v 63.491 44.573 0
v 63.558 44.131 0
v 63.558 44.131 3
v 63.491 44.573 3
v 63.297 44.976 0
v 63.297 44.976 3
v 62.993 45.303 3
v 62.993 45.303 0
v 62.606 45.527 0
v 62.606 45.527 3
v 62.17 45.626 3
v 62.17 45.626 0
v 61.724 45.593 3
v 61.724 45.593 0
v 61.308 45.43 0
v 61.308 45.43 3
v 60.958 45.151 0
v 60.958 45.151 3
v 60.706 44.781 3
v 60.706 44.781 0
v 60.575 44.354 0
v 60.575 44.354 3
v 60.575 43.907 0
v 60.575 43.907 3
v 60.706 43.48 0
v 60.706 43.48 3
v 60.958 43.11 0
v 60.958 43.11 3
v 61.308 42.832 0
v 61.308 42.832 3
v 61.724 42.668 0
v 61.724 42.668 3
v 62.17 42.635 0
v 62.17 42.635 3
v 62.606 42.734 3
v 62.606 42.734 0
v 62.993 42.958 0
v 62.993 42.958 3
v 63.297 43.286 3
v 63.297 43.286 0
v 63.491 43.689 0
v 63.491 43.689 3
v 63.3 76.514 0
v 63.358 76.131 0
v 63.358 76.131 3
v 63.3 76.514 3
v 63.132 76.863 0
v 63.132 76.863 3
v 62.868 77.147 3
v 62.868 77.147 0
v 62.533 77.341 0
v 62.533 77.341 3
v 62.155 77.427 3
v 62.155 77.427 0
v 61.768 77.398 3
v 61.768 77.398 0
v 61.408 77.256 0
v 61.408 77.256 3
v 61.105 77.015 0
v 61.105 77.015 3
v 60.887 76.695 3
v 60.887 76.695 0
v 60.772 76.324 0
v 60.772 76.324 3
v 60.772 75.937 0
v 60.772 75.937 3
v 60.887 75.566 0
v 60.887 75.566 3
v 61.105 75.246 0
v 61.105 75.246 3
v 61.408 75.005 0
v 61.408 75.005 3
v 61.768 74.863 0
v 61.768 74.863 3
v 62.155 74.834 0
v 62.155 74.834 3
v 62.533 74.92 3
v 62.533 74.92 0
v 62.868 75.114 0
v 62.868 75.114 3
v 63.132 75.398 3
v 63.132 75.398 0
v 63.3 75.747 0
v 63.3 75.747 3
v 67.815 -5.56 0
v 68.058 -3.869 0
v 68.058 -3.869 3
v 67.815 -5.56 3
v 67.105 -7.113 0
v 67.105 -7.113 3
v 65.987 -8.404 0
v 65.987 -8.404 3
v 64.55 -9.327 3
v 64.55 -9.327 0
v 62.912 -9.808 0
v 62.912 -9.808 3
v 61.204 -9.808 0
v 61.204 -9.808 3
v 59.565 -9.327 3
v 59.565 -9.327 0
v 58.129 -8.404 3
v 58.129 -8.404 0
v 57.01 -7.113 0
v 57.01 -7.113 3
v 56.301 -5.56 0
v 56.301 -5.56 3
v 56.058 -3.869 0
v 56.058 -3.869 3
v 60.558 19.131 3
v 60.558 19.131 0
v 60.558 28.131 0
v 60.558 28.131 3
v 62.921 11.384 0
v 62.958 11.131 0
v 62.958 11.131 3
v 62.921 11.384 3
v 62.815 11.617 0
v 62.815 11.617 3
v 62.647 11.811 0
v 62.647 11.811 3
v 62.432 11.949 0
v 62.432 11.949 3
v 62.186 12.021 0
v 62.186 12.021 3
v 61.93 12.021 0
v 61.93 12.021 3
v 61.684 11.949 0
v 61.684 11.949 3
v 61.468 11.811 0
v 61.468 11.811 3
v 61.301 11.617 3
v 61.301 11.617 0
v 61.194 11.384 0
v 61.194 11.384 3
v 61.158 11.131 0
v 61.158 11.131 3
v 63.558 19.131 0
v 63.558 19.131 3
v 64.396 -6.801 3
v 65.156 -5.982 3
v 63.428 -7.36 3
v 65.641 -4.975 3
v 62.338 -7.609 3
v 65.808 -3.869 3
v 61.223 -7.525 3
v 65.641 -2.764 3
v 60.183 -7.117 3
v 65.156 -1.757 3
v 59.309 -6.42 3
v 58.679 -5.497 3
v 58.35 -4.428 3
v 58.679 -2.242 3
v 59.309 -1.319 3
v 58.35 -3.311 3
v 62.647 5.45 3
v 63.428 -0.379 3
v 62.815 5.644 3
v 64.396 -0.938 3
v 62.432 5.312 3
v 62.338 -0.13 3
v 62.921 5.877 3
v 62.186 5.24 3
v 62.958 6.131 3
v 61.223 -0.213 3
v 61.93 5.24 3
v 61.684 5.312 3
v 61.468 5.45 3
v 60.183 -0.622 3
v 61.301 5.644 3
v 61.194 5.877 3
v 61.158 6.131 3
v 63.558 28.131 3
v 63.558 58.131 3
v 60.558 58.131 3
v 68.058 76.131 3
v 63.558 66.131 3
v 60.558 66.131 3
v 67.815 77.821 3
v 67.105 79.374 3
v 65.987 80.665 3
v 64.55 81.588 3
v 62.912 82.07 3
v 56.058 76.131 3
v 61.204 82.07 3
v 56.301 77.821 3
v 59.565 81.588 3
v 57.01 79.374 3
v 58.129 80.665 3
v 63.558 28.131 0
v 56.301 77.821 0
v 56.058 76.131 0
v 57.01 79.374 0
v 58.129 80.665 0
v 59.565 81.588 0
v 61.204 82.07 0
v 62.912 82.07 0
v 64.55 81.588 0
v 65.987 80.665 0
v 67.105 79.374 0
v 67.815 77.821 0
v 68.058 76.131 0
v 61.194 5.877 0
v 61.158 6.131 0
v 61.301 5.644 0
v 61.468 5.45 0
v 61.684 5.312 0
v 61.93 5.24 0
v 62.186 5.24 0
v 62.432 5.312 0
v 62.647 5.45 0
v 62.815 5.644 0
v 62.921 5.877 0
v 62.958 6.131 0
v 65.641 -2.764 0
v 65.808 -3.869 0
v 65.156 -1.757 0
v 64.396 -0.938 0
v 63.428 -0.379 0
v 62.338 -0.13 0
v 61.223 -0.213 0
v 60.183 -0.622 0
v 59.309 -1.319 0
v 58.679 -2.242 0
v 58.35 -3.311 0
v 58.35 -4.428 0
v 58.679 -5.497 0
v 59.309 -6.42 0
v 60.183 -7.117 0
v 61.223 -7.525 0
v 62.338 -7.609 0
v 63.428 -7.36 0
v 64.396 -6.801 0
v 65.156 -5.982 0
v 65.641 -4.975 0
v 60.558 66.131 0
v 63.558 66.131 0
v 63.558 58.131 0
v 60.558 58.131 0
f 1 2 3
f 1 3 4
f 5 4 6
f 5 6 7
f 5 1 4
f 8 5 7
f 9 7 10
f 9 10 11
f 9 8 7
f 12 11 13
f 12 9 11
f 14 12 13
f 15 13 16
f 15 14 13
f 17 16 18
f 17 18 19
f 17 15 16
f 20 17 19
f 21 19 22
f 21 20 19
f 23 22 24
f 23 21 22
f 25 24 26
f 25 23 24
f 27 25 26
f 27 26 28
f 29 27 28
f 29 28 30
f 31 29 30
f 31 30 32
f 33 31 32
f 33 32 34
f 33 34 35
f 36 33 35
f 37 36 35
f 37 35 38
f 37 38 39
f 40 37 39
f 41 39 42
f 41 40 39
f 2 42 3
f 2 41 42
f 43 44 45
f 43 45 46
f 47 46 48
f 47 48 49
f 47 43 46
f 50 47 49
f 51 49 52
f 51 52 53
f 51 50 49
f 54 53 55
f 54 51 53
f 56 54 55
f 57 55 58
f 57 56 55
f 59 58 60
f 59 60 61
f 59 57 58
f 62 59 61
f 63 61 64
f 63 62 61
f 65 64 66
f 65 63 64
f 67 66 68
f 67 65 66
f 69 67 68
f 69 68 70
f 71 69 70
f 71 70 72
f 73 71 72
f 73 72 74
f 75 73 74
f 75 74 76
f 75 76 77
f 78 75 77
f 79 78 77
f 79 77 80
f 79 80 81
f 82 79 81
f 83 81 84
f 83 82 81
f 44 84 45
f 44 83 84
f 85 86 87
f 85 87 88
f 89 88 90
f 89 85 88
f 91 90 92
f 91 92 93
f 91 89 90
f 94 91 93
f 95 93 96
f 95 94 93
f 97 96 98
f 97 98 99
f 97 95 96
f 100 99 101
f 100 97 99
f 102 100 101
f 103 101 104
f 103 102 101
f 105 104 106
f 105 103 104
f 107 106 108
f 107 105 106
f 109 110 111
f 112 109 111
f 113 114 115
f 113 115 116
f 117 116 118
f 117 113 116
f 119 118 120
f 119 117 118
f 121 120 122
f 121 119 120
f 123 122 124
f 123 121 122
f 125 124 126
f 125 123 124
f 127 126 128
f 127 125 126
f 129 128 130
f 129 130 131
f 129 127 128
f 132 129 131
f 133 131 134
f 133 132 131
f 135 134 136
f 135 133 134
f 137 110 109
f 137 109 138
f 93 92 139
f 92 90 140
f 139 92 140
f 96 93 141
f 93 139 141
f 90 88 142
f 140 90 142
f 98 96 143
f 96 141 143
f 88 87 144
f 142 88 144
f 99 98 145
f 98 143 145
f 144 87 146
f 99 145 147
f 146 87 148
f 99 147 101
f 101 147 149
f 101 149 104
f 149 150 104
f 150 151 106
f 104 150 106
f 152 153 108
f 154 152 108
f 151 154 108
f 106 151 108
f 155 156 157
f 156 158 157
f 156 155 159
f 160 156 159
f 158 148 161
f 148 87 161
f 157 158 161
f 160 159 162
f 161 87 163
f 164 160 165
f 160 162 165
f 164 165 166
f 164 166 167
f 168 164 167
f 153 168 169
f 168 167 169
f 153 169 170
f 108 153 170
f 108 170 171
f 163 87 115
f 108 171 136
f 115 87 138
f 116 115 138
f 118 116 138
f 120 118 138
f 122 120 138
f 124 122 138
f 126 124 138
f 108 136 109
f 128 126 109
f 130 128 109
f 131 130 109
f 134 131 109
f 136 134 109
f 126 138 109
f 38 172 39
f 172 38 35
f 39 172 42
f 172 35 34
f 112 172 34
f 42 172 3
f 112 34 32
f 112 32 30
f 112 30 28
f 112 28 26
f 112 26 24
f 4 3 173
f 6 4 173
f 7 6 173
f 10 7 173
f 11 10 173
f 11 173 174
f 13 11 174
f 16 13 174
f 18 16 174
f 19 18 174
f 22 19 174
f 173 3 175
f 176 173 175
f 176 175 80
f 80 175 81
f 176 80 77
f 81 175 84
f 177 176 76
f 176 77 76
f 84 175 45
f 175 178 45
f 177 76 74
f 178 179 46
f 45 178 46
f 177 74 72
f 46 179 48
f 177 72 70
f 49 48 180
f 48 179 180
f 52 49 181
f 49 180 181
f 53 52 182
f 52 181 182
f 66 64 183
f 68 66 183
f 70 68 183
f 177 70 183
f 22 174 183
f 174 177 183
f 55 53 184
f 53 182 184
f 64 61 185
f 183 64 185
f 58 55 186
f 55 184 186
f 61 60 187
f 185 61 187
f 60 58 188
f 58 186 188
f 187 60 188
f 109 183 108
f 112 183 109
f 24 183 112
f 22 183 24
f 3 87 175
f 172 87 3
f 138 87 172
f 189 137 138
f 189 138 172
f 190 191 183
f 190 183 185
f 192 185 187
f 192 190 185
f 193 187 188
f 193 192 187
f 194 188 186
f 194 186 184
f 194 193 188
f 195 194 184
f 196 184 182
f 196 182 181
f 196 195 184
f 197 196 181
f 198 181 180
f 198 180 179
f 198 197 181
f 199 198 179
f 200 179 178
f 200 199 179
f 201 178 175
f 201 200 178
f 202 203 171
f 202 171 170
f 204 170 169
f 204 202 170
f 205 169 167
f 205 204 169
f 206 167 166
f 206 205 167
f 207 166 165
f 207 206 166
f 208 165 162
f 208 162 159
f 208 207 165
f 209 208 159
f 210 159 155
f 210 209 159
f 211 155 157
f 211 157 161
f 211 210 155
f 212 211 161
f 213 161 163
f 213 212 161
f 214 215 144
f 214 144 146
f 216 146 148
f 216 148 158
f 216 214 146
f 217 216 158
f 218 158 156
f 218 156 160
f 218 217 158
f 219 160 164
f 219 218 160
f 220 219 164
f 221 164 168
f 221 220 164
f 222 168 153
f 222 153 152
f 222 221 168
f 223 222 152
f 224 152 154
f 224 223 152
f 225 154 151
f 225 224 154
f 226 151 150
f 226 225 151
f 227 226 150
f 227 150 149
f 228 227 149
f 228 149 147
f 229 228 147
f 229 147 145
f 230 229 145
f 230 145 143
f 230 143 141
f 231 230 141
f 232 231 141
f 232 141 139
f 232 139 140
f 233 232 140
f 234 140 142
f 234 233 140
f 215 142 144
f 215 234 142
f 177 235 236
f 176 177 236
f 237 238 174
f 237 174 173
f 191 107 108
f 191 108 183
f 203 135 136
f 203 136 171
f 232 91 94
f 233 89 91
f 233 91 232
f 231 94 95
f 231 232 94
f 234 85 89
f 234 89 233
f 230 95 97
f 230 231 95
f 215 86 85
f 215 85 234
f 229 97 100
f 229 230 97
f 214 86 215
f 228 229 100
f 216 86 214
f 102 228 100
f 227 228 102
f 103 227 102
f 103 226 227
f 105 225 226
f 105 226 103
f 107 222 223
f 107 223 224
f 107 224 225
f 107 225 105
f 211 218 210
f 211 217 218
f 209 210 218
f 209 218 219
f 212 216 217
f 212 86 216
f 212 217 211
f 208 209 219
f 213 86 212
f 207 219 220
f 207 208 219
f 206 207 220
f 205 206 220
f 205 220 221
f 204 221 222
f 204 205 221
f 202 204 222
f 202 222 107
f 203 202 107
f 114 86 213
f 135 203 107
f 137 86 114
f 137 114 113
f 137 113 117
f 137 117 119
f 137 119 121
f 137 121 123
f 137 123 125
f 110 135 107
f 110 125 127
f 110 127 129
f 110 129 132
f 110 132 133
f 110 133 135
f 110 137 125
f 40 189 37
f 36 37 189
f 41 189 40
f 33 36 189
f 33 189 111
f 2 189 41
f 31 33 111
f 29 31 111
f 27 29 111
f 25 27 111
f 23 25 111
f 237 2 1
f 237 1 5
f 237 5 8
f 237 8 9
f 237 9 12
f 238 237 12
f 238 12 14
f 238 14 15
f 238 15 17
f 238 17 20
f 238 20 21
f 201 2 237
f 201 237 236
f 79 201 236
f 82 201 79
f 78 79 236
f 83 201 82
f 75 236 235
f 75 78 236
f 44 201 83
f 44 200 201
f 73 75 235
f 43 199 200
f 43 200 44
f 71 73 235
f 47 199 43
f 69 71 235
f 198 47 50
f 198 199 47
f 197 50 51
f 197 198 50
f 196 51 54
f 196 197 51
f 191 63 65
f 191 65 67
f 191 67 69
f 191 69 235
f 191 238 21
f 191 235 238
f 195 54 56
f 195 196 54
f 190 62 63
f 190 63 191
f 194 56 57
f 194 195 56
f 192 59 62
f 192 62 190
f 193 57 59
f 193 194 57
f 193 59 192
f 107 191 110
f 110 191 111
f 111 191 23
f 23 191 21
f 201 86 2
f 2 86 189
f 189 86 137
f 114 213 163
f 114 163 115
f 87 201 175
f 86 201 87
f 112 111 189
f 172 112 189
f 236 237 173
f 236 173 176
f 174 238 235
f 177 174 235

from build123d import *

# Parameters (mm, degrees)
MODEL_R             = 3.750000001
MODEL_R_2           = 1.300000002
MODEL_R_3           = 1.500000002
MODEL_W             = 3
MODEL_H             = 9
MODEL_H_2           = 8
BOSS_EXTRUDE1_DEPTH = 3


with BuildPart() as part:
    # Model → Boss-Extrude1 (new body)
    with BuildSketch(Plane.XY):
        with BuildLine():
            Line((56.05776, -3.869466211), (56.05776, 76.130633789))
            ThreePointArc((56.05776, 76.130633789), (62.05781, 82.130583788), (68.05776, 76.130533788))
            Line((68.05776, 76.130533788), (68.05776, -3.869466211))
            ThreePointArc((68.05776, -3.869466211), (62.057759999, -9.869466211), (56.05776, -3.869466211))
        make_face()
        with Locations((62.057759999, -3.869466212)):
            Circle(MODEL_R, mode=Mode.SUBTRACT)
        with Locations((62.057759998, 76.130533787)):
            Circle(MODEL_R_2, mode=Mode.SUBTRACT)
        with Locations((62.057760002, 44.130633787)):
            Circle(MODEL_R_3, mode=Mode.SUBTRACT)
        with BuildLine():
            Line((61.15776, 11.130633789), (61.15776, 6.130533789))
            ThreePointArc((61.15776, 6.130533789), (62.05776, 5.230533789), (62.95776, 6.130533789))
            Line((62.95776, 6.130533789), (62.95776, 11.130533786))
            ThreePointArc((62.95776, 11.130533786), (62.057810001, 12.030583787), (61.15776, 11.130633789))
        make_face(mode=Mode.SUBTRACT)
        with Locations((62.05776, 23.630533789)):
            Rectangle(MODEL_W, MODEL_H, mode=Mode.SUBTRACT)
        with Locations((62.05776, 62.130533789)):
            Rectangle(MODEL_W, MODEL_H_2, mode=Mode.SUBTRACT)
    extrude(amount=BOSS_EXTRUDE1_DEPTH)


solid = part.part
